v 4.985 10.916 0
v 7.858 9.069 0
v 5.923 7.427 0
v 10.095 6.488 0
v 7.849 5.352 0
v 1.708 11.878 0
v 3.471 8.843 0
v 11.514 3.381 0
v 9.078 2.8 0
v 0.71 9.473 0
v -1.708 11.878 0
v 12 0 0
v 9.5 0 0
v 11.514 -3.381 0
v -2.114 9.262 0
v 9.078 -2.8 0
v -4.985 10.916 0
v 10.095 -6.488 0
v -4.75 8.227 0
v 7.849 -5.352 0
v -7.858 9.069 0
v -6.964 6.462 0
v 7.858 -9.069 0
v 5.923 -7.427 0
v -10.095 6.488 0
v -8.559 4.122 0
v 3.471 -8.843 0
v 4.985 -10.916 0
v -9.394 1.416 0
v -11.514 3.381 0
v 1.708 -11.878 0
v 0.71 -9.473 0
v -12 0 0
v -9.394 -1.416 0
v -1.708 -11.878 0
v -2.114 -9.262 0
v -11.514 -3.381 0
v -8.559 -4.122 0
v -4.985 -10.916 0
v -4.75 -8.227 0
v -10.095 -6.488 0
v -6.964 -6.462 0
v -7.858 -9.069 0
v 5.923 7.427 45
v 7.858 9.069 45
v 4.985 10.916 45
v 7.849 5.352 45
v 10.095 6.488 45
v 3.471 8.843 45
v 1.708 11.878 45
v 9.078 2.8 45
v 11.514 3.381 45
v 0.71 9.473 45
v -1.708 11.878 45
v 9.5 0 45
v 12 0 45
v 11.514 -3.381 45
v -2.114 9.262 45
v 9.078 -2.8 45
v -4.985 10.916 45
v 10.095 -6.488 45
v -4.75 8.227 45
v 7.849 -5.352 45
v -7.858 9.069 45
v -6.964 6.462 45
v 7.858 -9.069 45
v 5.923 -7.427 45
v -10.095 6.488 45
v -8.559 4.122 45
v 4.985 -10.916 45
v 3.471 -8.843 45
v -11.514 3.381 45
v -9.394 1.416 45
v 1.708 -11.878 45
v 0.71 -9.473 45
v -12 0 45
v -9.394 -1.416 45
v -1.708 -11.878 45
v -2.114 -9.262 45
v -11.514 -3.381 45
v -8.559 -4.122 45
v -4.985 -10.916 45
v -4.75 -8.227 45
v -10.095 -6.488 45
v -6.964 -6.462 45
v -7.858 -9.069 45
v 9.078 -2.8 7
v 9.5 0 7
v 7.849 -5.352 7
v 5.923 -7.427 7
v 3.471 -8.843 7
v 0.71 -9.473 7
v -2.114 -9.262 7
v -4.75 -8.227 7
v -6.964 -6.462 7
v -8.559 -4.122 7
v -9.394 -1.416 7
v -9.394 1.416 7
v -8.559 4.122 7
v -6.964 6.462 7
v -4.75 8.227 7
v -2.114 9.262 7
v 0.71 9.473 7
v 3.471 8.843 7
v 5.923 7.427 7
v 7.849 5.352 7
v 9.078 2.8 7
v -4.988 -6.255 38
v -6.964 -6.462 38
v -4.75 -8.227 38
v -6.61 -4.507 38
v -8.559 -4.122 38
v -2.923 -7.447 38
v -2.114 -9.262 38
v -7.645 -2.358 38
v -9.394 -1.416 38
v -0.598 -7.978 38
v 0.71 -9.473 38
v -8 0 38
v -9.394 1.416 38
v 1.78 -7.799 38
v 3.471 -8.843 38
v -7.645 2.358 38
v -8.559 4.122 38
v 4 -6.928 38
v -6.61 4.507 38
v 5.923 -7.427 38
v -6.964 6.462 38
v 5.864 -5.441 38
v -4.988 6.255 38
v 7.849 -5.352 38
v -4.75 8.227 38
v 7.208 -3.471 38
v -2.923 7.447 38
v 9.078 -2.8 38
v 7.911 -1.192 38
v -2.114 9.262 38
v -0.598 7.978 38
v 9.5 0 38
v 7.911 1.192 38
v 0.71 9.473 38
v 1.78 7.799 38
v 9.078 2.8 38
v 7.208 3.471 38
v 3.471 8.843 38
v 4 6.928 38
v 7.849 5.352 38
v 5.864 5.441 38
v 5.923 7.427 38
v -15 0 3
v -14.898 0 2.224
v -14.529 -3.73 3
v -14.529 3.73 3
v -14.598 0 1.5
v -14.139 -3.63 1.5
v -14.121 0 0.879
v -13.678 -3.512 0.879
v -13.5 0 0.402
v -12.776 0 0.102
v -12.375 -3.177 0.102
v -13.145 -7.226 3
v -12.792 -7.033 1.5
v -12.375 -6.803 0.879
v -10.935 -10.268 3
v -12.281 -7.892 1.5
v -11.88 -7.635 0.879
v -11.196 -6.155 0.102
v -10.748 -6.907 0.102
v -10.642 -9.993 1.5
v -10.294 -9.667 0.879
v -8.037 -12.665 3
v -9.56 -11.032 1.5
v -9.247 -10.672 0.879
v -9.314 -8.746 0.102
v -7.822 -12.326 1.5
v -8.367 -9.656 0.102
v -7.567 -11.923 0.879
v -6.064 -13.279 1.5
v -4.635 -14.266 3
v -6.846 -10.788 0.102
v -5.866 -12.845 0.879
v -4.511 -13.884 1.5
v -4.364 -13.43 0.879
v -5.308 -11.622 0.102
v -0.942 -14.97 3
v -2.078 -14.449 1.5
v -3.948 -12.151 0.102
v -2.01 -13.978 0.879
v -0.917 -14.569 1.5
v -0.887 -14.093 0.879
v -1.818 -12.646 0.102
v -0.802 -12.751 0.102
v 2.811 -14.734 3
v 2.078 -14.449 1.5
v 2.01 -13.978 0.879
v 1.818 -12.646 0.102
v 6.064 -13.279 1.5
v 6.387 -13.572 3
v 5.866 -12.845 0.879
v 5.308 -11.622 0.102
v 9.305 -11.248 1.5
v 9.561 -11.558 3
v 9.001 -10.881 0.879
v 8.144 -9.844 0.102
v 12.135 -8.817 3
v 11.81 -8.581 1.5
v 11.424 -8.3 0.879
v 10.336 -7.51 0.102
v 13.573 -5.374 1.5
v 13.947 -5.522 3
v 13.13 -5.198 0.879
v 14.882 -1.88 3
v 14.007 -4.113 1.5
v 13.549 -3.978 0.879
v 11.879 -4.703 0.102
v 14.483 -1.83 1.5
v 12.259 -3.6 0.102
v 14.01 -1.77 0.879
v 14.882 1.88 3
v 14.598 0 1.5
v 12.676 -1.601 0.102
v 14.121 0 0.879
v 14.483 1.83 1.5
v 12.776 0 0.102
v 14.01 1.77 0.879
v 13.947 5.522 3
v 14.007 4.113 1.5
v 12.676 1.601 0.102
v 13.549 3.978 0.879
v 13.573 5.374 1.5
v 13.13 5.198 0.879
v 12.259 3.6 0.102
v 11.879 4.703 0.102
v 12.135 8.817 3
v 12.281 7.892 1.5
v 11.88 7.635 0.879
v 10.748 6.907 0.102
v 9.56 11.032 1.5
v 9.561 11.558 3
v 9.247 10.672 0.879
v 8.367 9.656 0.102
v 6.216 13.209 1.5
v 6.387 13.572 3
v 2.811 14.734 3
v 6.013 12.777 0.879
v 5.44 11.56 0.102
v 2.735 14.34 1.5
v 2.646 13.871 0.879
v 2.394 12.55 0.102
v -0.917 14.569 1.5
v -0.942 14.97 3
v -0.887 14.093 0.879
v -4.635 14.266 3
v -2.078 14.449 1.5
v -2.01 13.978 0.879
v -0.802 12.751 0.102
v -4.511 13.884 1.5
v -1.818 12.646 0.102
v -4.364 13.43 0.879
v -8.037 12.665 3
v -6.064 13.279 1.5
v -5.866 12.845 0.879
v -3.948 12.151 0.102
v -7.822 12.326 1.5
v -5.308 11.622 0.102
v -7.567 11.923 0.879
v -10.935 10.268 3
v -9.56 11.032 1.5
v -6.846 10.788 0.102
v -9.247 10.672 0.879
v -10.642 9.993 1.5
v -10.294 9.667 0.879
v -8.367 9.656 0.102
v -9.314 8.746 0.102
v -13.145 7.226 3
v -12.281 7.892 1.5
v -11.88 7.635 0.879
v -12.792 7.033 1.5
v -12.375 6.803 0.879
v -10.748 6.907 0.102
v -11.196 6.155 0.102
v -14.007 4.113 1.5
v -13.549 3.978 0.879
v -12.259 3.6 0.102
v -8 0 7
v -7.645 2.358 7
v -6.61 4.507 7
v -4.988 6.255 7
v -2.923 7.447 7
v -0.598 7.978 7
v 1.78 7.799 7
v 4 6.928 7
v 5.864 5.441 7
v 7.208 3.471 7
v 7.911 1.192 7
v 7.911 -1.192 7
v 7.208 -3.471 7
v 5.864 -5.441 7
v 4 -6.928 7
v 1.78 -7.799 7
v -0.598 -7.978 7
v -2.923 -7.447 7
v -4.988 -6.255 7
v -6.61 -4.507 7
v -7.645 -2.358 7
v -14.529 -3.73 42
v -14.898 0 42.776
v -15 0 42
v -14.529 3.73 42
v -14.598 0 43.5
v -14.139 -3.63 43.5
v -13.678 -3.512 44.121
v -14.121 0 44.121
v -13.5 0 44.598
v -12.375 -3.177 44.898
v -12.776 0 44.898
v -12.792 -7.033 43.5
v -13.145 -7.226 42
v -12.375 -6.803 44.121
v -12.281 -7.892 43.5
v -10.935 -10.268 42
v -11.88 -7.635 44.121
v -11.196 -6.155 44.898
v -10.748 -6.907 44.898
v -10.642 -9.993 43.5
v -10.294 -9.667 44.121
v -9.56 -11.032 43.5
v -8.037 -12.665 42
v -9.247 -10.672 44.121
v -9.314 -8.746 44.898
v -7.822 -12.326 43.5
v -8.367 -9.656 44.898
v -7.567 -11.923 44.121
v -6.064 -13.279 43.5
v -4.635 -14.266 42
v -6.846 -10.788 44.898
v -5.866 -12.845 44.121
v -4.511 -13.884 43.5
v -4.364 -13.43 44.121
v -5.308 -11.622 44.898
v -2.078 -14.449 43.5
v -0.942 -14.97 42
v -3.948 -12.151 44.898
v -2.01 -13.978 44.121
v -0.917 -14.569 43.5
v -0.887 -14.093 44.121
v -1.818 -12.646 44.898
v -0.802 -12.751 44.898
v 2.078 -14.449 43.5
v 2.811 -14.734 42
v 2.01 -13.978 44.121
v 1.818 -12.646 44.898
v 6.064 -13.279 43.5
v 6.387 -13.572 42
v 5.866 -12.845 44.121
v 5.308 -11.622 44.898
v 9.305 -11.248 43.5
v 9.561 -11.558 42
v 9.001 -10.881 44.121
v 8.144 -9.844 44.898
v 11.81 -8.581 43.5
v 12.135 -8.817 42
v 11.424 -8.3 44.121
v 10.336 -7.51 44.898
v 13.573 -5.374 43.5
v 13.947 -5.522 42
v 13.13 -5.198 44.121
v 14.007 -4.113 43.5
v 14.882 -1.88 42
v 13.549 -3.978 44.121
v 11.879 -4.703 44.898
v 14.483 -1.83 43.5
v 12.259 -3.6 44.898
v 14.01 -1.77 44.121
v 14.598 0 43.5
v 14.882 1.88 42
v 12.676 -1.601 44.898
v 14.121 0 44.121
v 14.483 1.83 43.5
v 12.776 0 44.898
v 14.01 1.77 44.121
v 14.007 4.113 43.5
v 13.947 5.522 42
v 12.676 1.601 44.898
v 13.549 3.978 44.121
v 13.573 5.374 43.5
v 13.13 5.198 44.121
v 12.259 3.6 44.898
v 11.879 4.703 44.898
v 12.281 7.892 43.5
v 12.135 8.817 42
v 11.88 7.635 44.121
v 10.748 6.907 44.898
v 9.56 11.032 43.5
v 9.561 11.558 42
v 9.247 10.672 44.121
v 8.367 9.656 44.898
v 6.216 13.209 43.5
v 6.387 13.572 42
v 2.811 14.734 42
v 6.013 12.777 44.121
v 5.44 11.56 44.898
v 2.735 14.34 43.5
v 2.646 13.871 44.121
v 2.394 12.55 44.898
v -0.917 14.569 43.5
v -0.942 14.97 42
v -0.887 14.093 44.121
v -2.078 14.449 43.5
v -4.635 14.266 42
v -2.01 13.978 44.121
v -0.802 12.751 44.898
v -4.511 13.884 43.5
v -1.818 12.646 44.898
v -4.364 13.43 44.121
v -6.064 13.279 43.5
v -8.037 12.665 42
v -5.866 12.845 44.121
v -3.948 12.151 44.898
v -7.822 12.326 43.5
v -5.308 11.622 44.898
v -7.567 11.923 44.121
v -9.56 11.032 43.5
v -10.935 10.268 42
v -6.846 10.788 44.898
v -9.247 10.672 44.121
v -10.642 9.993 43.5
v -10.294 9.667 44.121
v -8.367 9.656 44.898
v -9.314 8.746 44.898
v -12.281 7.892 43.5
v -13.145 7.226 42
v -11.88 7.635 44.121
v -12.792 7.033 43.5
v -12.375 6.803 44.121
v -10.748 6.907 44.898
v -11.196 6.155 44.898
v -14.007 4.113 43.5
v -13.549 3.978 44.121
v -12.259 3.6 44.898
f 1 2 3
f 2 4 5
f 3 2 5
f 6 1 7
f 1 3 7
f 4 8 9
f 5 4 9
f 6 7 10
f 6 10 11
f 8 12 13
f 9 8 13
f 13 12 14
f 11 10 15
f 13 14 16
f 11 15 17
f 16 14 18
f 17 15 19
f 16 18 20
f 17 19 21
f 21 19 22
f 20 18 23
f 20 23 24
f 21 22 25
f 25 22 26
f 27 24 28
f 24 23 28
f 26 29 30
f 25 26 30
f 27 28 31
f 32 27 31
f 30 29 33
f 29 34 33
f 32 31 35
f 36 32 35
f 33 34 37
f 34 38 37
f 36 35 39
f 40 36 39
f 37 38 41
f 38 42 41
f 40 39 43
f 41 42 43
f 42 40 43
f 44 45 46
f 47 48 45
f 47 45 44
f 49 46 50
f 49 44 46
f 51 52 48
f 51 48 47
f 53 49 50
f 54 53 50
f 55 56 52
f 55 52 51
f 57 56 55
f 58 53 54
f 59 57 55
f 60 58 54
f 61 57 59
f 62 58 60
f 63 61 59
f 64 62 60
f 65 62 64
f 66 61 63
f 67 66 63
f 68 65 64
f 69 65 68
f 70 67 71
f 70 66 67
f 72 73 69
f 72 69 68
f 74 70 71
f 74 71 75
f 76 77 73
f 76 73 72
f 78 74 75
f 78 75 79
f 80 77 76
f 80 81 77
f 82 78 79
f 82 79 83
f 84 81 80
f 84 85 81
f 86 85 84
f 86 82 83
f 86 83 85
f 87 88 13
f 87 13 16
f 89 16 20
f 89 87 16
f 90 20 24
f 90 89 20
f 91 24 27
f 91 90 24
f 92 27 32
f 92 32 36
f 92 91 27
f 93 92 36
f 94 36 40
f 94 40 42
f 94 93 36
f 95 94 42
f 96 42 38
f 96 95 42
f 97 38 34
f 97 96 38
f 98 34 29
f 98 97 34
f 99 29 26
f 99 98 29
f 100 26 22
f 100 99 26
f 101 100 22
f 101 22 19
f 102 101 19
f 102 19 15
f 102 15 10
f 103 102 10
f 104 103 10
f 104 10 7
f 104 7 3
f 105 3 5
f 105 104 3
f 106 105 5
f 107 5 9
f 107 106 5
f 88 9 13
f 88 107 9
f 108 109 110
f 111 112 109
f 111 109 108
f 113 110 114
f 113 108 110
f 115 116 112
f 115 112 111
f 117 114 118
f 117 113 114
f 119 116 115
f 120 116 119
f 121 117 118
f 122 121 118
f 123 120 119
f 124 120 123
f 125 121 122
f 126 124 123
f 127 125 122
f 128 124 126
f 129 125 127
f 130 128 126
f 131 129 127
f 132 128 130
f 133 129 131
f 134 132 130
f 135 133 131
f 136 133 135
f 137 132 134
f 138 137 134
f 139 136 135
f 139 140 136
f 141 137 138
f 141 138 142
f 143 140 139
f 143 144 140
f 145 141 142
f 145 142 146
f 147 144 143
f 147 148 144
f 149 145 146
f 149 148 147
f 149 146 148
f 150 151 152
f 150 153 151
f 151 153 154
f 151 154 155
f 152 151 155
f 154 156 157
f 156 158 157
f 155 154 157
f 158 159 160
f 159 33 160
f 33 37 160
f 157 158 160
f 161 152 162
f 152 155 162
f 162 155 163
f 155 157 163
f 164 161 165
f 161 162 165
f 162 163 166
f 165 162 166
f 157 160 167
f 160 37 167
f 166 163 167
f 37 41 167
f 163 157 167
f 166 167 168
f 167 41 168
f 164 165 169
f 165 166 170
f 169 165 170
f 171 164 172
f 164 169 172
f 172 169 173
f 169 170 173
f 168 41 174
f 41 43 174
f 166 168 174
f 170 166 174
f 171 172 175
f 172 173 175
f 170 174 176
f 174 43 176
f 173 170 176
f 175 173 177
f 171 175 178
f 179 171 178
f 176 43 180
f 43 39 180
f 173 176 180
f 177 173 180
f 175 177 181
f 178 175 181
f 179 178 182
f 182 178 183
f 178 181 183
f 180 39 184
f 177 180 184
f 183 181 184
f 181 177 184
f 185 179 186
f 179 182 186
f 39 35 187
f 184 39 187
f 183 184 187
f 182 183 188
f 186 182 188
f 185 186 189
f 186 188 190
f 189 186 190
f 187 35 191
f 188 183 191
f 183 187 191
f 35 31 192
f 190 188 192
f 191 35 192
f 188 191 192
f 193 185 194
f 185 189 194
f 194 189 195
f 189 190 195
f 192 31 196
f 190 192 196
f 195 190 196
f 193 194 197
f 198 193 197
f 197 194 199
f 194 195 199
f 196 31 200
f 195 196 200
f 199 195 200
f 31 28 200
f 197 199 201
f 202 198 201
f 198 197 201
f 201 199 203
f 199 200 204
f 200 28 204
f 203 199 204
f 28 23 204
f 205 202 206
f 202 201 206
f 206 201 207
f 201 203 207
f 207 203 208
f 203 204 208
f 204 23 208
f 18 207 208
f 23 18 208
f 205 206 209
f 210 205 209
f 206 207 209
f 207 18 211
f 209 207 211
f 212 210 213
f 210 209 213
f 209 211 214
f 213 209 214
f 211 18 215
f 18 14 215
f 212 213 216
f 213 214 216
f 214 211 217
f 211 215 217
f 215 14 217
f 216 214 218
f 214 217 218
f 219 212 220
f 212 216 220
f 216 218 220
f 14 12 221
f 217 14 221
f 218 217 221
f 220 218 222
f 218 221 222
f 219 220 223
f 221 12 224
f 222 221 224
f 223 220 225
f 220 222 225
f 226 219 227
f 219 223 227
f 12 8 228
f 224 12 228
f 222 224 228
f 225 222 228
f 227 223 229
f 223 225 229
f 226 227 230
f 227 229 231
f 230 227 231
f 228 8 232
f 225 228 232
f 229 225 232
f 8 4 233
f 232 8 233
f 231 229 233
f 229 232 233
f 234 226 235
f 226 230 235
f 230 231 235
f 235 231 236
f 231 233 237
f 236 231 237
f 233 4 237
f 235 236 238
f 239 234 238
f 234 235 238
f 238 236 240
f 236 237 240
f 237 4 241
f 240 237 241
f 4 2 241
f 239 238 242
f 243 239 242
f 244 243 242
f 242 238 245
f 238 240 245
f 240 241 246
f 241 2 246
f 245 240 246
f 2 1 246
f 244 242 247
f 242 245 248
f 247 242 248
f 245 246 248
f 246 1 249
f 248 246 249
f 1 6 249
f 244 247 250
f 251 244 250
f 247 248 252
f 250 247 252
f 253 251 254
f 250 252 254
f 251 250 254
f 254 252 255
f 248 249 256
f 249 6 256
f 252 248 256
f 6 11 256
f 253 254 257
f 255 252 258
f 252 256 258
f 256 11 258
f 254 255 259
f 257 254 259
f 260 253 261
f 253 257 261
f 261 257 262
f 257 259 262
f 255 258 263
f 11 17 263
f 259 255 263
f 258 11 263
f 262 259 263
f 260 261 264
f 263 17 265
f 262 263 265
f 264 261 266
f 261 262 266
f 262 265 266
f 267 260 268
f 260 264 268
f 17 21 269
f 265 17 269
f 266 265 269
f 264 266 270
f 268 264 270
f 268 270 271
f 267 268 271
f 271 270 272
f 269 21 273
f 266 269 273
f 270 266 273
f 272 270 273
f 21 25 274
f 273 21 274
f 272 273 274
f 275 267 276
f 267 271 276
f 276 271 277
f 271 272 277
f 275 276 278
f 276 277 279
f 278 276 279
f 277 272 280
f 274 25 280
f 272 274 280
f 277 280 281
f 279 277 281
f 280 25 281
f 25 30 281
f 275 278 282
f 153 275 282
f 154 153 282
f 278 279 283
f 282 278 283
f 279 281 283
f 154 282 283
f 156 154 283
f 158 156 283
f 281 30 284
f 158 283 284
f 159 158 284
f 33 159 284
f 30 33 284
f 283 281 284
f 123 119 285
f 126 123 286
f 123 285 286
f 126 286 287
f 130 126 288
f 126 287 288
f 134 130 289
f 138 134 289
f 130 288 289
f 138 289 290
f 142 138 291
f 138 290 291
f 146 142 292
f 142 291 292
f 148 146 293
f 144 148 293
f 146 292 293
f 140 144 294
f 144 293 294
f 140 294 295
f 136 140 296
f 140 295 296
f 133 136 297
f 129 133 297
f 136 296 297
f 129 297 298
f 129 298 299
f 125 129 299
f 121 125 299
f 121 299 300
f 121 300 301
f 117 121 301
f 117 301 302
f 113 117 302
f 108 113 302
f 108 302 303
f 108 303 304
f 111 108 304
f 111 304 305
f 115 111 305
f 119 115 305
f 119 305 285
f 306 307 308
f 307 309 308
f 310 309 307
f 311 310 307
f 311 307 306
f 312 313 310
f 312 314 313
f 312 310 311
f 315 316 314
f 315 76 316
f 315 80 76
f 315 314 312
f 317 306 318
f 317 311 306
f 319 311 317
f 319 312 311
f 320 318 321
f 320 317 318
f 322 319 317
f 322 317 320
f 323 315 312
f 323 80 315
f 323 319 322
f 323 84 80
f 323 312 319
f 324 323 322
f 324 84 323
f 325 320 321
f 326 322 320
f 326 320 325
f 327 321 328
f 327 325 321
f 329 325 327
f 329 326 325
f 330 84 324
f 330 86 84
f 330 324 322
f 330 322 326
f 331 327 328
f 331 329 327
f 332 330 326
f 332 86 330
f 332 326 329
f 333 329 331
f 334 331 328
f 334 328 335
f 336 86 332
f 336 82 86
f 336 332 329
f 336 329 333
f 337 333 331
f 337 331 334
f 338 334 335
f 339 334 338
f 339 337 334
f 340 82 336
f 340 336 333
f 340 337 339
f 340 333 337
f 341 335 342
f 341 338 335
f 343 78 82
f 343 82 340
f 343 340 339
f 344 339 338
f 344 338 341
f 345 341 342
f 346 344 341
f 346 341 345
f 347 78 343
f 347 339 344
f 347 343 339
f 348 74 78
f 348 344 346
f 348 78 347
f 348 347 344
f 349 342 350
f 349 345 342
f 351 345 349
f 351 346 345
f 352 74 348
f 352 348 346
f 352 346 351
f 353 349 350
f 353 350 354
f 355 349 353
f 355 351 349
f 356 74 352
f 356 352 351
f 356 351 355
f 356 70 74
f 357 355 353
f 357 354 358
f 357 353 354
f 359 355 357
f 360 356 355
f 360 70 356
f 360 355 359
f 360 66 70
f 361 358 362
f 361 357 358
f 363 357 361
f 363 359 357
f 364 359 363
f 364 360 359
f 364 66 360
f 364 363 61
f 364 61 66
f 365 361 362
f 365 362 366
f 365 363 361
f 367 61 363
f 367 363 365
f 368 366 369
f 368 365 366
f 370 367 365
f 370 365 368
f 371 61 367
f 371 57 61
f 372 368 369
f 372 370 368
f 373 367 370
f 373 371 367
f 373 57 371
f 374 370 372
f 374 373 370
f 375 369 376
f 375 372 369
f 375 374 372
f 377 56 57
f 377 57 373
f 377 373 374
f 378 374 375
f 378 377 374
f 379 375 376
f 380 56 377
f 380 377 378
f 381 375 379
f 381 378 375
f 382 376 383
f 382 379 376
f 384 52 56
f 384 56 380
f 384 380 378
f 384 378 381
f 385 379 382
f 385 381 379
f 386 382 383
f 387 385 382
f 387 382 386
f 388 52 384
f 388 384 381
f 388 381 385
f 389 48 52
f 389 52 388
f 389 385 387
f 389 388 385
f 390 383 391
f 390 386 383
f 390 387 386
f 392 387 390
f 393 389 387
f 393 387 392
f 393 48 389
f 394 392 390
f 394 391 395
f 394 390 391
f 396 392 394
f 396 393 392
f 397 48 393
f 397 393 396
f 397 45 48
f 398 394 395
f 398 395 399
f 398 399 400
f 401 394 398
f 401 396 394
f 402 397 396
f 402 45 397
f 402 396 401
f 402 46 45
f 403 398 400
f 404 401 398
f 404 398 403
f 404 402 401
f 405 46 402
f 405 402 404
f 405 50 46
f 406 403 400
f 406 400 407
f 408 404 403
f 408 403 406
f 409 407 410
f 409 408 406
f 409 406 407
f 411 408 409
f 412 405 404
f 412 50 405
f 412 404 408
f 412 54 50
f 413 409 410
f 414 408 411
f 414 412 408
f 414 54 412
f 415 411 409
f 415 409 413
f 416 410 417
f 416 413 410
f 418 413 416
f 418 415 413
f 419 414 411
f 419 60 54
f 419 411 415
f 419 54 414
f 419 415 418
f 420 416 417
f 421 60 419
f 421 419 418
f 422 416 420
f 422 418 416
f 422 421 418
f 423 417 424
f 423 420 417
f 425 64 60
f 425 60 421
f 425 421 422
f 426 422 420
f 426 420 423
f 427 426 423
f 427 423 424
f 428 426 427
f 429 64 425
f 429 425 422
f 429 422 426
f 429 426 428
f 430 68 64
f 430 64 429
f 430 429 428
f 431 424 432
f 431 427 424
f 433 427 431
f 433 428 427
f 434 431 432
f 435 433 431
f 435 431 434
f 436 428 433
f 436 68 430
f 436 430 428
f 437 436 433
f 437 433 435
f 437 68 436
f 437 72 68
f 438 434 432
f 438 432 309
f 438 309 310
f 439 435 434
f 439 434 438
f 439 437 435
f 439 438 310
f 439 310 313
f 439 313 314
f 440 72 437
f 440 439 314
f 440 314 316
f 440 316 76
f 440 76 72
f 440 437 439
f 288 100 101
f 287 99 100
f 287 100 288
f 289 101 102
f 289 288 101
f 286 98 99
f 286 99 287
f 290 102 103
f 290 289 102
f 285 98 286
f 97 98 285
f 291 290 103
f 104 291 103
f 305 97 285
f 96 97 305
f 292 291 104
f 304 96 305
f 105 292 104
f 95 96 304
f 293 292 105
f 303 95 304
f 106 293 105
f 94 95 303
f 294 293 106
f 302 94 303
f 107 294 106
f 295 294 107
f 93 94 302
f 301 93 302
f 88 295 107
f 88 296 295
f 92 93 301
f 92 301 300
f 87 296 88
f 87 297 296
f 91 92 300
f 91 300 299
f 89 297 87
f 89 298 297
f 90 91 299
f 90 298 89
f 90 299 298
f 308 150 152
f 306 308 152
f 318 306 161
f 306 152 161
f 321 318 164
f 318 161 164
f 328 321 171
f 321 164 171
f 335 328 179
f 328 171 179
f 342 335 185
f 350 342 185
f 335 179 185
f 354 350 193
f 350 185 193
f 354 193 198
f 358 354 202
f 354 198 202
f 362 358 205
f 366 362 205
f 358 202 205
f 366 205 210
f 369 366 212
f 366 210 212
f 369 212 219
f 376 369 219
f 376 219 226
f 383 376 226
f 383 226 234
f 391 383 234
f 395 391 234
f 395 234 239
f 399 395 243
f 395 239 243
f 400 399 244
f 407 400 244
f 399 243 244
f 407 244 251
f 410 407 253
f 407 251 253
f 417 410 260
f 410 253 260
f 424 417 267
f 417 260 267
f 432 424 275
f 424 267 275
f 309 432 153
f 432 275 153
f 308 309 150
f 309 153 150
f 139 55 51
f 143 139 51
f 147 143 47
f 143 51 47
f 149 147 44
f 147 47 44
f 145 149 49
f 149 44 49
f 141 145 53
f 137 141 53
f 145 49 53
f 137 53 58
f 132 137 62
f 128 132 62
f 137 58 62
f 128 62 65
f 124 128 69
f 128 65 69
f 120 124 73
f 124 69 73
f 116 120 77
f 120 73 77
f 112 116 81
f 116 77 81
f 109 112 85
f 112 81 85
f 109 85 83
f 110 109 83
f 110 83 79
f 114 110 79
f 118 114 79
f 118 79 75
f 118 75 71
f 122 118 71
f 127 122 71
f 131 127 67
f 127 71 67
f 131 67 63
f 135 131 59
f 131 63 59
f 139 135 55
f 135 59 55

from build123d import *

# Parameters (mm, degrees)
ESQUISSE1_R             = 15
BOSS_EXTRU_1_DEPTH      = 45
ESQUISSE4_R             = 9.5
ENL_V_MAT_EXTRU_3_DEPTH = 7
ENL_V_START             = -7
ESQUISSE5_R             = 9.5
ENL_V_MAT_EXTRU_4_DEPTH = 7
ESQUISSE6_R             = 8
ENL_V_MAT_EXTRU_5_DEPTH = 60
CONG_1_R                = 3


with BuildPart() as part:
    # Esquisse1 → Boss.-Extru.1 (new body)
    with BuildSketch(Plane.XY):
        with Locations(Location((0, 0, 0), (0, 0, 180))):
            Circle(ESQUISSE1_R)
    extrude(amount=BOSS_EXTRU_1_DEPTH)

    # Esquisse4 → Enlèv. mat.-Extru.3 (cut)
    with BuildSketch(Plane.XY.offset(45)):
        Circle(ESQUISSE4_R)
    extrude(amount=-ENL_V_MAT_EXTRU_3_DEPTH, mode=Mode.SUBTRACT)

    # Esquisse5 → Enlèv. mat.-Extru.4 (cut)
    with BuildSketch(Plane(origin=(0, 0, 0), x_dir=(-1, 0, 0), z_dir=(0, 0, -1)).offset(ENL_V_START)):
        with Locations(Location((0, 0, 0), (0, 0, 180))):
            Circle(ESQUISSE5_R)
    extrude(amount=ENL_V_MAT_EXTRU_4_DEPTH, mode=Mode.SUBTRACT)

    # Esquisse6 → Enlèv. mat.-Extru.5 (cut)
    with BuildSketch(Plane(origin=(0, 0, 7), x_dir=(-1, 0, 0), z_dir=(0, 0, -1))):
        Circle(ESQUISSE6_R)
    extrude(amount=-ENL_V_MAT_EXTRU_5_DEPTH, mode=Mode.SUBTRACT)

    # Congé1
    cong_1_edges = [part.edges().sort_by_distance(p)[0] for p in [
        (15, 0, 0),
        (15, 0, 45),
    ]]
    fillet(cong_1_edges, radius=CONG_1_R)


solid = part.part
